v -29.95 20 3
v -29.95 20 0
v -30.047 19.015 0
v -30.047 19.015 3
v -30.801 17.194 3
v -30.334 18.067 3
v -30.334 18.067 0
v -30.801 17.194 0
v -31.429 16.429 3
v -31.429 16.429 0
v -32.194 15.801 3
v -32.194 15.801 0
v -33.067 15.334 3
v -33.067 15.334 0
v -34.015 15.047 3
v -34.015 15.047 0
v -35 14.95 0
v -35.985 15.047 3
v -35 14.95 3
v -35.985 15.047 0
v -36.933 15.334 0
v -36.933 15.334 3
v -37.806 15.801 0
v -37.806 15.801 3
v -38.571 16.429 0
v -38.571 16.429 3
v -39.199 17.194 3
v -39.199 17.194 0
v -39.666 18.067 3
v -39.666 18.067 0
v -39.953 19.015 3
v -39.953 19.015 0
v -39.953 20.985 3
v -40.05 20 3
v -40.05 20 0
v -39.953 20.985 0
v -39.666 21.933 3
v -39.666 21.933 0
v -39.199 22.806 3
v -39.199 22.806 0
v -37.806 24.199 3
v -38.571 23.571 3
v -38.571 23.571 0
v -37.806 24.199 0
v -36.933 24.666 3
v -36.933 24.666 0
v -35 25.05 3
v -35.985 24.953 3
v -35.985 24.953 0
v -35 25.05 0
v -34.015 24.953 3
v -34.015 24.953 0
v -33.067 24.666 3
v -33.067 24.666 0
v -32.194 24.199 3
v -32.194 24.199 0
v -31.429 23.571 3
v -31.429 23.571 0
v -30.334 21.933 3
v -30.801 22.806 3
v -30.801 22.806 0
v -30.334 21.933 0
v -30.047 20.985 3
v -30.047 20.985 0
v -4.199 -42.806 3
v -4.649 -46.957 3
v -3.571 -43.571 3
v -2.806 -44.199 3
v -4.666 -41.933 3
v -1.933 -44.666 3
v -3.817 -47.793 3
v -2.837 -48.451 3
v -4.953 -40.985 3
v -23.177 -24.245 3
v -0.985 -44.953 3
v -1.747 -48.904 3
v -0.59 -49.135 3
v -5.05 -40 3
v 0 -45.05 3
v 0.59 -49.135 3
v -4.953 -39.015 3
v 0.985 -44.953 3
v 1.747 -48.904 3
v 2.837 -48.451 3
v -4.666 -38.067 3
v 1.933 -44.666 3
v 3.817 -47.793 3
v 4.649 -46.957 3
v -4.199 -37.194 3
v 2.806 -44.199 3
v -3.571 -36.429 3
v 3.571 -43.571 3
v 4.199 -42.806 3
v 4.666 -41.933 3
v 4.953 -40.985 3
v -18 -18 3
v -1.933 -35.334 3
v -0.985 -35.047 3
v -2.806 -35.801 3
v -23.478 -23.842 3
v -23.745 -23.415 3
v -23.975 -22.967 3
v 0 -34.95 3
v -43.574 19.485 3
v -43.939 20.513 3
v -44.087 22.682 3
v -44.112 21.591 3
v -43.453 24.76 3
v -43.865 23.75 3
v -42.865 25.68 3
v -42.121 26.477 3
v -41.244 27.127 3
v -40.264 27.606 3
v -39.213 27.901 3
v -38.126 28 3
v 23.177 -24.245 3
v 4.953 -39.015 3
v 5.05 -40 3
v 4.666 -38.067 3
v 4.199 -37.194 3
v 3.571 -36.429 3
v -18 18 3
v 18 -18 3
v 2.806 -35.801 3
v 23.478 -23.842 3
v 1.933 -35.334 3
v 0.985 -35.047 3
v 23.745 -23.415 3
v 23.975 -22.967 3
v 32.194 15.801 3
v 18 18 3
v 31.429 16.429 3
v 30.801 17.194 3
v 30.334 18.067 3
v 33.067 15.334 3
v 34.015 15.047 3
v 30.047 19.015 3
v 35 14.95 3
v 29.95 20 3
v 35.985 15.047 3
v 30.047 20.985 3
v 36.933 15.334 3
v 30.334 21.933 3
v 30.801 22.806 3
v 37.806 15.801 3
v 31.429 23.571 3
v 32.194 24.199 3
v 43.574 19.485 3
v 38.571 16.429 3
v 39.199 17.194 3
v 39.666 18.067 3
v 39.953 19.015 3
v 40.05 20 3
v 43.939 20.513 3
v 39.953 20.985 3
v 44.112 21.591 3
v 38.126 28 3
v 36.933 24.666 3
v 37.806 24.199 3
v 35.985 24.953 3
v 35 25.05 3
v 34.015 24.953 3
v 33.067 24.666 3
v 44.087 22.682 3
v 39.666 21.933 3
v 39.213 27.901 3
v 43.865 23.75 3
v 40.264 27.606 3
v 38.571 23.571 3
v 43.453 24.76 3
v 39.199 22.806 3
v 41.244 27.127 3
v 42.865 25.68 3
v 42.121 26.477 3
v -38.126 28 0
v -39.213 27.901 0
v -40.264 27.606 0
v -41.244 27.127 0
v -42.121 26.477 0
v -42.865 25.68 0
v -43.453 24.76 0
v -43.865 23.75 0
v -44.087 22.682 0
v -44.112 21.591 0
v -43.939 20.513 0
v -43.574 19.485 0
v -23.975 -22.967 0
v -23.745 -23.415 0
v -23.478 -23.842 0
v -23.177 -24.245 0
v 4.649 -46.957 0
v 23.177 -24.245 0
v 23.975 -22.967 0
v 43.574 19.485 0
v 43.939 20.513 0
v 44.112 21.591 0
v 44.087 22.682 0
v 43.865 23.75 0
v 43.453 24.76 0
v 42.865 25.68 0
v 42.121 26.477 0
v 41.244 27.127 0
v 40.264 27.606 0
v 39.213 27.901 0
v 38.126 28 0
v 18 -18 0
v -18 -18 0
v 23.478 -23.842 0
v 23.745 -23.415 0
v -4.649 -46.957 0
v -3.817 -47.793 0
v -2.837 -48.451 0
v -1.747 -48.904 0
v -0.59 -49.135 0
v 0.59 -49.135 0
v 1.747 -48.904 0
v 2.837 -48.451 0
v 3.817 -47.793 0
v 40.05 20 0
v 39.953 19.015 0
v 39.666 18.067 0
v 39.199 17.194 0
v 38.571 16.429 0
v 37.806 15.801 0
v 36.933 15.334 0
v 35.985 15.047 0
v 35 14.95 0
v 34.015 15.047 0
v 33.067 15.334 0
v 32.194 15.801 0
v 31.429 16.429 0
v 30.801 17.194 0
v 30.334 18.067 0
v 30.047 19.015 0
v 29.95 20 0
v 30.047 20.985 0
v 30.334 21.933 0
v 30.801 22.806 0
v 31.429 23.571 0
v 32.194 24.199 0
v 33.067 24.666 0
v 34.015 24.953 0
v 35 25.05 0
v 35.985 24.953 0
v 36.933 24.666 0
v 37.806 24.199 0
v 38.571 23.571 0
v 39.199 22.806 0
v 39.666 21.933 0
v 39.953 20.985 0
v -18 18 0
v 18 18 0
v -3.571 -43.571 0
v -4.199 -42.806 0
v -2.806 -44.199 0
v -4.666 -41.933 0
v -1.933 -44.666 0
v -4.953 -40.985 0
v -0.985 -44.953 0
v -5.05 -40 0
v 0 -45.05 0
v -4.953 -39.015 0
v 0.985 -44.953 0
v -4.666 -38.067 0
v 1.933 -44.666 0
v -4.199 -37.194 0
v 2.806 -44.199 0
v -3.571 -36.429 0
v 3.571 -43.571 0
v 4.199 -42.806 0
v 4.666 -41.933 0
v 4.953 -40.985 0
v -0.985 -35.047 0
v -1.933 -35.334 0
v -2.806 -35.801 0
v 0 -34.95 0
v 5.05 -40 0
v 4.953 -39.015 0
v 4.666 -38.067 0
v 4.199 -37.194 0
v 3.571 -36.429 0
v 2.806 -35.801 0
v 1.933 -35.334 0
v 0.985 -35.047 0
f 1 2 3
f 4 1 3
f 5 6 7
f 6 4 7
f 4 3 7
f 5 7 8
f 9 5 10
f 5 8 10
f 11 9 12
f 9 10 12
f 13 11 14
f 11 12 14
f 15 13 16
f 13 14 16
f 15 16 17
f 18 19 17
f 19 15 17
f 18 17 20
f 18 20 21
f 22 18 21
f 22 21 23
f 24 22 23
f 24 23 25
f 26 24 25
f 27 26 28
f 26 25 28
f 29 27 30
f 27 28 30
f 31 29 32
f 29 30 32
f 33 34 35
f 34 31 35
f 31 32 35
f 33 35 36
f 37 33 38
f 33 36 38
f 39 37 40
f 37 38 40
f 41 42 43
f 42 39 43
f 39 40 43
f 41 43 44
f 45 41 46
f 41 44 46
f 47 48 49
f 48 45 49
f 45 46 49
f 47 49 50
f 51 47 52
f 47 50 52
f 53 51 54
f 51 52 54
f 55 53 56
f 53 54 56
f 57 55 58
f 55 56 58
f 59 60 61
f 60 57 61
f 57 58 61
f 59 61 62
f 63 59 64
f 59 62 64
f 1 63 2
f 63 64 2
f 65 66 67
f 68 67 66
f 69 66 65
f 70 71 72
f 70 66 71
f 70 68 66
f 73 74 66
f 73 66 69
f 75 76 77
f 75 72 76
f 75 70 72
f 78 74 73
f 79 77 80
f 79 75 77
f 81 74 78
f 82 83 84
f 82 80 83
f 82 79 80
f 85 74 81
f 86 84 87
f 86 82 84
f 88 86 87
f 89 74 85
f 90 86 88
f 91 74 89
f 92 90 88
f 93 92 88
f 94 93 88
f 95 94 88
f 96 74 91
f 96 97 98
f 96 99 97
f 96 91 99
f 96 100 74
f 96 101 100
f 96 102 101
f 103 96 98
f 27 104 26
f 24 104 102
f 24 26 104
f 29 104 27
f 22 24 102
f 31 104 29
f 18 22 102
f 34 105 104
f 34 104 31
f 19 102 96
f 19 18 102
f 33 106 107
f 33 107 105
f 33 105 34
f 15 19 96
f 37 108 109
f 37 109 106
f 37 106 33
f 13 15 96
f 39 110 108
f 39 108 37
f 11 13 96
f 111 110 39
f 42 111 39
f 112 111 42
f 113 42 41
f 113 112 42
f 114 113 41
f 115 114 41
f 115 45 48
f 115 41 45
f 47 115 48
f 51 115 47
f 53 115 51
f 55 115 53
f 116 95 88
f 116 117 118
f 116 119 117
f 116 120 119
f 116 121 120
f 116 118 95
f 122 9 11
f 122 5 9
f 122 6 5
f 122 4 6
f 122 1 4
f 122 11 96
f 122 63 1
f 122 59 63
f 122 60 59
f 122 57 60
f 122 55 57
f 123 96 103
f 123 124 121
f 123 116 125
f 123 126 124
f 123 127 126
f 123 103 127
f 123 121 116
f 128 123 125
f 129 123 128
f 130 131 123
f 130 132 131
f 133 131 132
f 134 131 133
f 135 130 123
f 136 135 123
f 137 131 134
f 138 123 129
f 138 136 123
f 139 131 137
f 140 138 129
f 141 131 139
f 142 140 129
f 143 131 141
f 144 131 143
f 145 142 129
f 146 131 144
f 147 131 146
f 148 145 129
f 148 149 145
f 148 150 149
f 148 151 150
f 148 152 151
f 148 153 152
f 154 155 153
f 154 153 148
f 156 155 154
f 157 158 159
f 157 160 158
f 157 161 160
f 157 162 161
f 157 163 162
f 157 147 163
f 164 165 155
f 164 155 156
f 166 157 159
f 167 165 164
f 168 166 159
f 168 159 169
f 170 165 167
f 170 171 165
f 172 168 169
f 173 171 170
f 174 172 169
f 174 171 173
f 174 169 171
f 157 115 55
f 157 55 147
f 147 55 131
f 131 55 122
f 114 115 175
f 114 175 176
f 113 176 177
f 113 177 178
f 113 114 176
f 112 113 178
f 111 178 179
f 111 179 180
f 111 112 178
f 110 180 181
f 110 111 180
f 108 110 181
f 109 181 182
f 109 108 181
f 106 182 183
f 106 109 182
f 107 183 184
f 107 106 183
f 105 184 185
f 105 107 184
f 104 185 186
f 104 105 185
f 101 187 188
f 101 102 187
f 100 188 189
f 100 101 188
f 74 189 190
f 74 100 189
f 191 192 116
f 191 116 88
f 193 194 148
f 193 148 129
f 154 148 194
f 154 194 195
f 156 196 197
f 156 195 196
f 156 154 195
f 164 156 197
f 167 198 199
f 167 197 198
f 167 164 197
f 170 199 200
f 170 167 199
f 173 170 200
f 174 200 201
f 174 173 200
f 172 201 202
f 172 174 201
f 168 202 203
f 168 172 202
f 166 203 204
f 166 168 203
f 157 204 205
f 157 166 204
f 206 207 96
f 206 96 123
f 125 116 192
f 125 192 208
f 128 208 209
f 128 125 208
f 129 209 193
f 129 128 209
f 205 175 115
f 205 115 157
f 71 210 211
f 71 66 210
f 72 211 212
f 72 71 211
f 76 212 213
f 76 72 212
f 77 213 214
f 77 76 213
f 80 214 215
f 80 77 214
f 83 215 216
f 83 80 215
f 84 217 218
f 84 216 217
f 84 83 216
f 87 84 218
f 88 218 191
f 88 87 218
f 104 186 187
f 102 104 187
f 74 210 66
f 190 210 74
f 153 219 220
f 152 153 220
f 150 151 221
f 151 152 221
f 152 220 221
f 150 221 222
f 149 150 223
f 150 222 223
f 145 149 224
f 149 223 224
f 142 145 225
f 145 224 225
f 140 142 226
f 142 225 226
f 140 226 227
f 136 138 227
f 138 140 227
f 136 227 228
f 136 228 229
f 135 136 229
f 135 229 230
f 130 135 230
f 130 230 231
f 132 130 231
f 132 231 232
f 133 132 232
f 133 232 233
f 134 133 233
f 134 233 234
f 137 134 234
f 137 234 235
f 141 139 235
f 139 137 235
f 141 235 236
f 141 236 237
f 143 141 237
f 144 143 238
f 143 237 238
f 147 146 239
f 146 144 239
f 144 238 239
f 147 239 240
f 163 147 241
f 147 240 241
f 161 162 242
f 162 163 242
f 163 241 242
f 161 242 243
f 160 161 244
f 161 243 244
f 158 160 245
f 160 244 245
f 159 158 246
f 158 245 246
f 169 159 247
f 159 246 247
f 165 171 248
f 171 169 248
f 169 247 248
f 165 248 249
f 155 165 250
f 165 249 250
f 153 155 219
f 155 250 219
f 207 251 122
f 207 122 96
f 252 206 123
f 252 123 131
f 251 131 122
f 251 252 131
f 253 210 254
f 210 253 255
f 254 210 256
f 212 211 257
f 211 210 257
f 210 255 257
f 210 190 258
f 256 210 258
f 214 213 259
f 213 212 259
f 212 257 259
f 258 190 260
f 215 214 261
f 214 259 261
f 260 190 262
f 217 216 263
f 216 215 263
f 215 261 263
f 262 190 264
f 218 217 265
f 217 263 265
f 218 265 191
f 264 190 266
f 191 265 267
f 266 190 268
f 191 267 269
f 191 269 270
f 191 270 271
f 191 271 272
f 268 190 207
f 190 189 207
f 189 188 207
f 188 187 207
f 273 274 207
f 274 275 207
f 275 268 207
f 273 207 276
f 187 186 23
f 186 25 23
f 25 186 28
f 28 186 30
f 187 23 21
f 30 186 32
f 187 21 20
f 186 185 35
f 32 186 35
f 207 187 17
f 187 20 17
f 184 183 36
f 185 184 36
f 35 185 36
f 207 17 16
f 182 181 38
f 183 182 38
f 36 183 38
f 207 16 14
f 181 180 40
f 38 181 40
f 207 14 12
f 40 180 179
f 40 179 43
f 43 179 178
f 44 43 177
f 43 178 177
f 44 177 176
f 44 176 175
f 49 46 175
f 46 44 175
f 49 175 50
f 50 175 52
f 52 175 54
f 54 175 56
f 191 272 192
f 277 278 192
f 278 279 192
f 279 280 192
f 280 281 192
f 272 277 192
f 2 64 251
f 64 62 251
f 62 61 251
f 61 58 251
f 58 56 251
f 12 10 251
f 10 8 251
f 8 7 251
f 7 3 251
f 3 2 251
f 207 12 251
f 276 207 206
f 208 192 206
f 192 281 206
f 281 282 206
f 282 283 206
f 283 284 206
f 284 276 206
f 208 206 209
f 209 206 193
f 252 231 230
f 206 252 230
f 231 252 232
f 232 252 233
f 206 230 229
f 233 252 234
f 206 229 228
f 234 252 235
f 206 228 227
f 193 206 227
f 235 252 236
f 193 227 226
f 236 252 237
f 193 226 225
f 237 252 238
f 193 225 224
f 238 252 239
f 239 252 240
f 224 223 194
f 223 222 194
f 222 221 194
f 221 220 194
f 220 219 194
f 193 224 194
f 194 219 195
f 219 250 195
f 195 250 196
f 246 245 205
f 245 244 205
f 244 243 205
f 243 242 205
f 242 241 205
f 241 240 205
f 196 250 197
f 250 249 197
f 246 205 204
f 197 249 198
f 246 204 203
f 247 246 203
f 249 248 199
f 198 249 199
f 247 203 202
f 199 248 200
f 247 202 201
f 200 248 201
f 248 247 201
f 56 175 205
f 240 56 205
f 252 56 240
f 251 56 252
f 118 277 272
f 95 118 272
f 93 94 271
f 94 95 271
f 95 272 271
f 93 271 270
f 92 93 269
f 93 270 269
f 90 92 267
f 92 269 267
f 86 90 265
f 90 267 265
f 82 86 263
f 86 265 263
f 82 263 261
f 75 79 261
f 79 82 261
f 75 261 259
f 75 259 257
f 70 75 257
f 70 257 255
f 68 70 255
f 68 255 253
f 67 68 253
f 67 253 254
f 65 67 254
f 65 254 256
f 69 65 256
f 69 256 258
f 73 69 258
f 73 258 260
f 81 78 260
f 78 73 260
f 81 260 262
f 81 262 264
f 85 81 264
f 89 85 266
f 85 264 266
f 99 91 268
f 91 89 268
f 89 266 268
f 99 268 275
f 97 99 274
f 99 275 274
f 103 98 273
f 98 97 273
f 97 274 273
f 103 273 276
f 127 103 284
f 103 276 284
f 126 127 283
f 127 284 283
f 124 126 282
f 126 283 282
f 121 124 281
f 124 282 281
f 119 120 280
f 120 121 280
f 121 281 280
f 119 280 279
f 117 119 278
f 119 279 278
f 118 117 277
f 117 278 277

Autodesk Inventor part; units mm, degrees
ref_plane "YZ Plane" through (0, 0, 0) normal (1, 0, 0) x (0, 1, 0)
ref_plane "XZ Plane" through (0, 0, 0) normal (0, 1, 0) x (-1, 0, 0)
ref_plane "XY Plane" through (0, 0, 0) normal (0, 0, 1) x (1, 0, 0)
sketch "Sketch6" plane through (0, 0, 0) normal (0, 0, 1) x (1, 0, 0)
  line L0 (18, 18) -> (-18, 18)
  line L1 (-18, 18) -> (-18, -18)
  line L2 (-18, -18) -> (18, -18)
  line L3 (18, -18) -> (18, 18)
  line L4 (18, 18) -> (-18, -18) construction
  circle A0 centre (0, -40) radius 5.05
  circle A1 centre (35, 20) radius 5.05
  circle A2 centre (-35, 20) radius 5.05
  line L5 (35, 20) -> (-35, 20) construction
  line L6 (-35, 20) -> (0, -40) construction
  line L7 (0, -40) -> (35, 20) construction
  line L8 (0, 18) -> (0, -18) construction
  line L9 (-47.5046, 28) -> (47.5046, 28)
  line L10 (-18, 18) -> (23.6569, -23.6569) construction
  line L11 (18, 18) -> (-23.6569, -23.6569) construction
  line L12 (47.5046, 28) -> (23.6569, -23.6569)
  line L13 (23.6569, -23.6569) -> (0, -52.6557)
  line L14 (0, -52.6557) -> (-23.6569, -23.6569)
  line L15 (-47.5046, 28) -> (-23.6569, -23.6569)
  line L16 (-35, 20) -> (-42.2633, 16.6468) construction
  line L17 (0, -40) -> (-6.1989, -45.057) construction
  point P0 (0, 0)
  point P1 (0, 0)
  point P2 (60, 0)
  point P3 (0, 28)
  point P4 (0, 0)
  dimension "d30" = 36
  dimension "d31" = 36
  dimension "d33" = 10.1
  dimension "d37" = 69.4622
  dimension "d52" = 70
  dimension "d53" = 8
  dimension "d54" = 20
  dimension "d57" = 8
  dimension "d59" = 8
  dimension "d60" = 95.0092
  dimension "d61" = 60
  dimension "d62" = 8
  dimension "d63" = 8
extrude "Plate3" add sketch "Sketch6" along normal blind 3
fillet "Corner Round2" radius 6 5 edges at (-47.5046, 28, 1.5) (47.5046, 28, 1.5) (0, -52.6557, 1.5) (-23.6569, -23.6569, 1.5) (23.6569, -23.6569, 1.5)
equation "\"d41\" = Thickness"
equation "\"BendReliefWidth\" = Thickness"
equation "\"BendReliefDepth\" = 0.5 * Thickness"
equation "\"CornerReliefSize\" = 4 * Thickness"
equation "\"MinimumRemnant\" = 2 * Thickness"
equation "\"TransitionRadius\" = BendRadius"
equation "\"JacobiRadiusSize\" = BendRadius"
equation "\"GapSize\" = Thickness"
equation "\"Thickness\" = 3"
equation "\"BendRadius\" = 5"
properties part number "MNT-CDF-504 small tube flange" material "Stainless Steel"
